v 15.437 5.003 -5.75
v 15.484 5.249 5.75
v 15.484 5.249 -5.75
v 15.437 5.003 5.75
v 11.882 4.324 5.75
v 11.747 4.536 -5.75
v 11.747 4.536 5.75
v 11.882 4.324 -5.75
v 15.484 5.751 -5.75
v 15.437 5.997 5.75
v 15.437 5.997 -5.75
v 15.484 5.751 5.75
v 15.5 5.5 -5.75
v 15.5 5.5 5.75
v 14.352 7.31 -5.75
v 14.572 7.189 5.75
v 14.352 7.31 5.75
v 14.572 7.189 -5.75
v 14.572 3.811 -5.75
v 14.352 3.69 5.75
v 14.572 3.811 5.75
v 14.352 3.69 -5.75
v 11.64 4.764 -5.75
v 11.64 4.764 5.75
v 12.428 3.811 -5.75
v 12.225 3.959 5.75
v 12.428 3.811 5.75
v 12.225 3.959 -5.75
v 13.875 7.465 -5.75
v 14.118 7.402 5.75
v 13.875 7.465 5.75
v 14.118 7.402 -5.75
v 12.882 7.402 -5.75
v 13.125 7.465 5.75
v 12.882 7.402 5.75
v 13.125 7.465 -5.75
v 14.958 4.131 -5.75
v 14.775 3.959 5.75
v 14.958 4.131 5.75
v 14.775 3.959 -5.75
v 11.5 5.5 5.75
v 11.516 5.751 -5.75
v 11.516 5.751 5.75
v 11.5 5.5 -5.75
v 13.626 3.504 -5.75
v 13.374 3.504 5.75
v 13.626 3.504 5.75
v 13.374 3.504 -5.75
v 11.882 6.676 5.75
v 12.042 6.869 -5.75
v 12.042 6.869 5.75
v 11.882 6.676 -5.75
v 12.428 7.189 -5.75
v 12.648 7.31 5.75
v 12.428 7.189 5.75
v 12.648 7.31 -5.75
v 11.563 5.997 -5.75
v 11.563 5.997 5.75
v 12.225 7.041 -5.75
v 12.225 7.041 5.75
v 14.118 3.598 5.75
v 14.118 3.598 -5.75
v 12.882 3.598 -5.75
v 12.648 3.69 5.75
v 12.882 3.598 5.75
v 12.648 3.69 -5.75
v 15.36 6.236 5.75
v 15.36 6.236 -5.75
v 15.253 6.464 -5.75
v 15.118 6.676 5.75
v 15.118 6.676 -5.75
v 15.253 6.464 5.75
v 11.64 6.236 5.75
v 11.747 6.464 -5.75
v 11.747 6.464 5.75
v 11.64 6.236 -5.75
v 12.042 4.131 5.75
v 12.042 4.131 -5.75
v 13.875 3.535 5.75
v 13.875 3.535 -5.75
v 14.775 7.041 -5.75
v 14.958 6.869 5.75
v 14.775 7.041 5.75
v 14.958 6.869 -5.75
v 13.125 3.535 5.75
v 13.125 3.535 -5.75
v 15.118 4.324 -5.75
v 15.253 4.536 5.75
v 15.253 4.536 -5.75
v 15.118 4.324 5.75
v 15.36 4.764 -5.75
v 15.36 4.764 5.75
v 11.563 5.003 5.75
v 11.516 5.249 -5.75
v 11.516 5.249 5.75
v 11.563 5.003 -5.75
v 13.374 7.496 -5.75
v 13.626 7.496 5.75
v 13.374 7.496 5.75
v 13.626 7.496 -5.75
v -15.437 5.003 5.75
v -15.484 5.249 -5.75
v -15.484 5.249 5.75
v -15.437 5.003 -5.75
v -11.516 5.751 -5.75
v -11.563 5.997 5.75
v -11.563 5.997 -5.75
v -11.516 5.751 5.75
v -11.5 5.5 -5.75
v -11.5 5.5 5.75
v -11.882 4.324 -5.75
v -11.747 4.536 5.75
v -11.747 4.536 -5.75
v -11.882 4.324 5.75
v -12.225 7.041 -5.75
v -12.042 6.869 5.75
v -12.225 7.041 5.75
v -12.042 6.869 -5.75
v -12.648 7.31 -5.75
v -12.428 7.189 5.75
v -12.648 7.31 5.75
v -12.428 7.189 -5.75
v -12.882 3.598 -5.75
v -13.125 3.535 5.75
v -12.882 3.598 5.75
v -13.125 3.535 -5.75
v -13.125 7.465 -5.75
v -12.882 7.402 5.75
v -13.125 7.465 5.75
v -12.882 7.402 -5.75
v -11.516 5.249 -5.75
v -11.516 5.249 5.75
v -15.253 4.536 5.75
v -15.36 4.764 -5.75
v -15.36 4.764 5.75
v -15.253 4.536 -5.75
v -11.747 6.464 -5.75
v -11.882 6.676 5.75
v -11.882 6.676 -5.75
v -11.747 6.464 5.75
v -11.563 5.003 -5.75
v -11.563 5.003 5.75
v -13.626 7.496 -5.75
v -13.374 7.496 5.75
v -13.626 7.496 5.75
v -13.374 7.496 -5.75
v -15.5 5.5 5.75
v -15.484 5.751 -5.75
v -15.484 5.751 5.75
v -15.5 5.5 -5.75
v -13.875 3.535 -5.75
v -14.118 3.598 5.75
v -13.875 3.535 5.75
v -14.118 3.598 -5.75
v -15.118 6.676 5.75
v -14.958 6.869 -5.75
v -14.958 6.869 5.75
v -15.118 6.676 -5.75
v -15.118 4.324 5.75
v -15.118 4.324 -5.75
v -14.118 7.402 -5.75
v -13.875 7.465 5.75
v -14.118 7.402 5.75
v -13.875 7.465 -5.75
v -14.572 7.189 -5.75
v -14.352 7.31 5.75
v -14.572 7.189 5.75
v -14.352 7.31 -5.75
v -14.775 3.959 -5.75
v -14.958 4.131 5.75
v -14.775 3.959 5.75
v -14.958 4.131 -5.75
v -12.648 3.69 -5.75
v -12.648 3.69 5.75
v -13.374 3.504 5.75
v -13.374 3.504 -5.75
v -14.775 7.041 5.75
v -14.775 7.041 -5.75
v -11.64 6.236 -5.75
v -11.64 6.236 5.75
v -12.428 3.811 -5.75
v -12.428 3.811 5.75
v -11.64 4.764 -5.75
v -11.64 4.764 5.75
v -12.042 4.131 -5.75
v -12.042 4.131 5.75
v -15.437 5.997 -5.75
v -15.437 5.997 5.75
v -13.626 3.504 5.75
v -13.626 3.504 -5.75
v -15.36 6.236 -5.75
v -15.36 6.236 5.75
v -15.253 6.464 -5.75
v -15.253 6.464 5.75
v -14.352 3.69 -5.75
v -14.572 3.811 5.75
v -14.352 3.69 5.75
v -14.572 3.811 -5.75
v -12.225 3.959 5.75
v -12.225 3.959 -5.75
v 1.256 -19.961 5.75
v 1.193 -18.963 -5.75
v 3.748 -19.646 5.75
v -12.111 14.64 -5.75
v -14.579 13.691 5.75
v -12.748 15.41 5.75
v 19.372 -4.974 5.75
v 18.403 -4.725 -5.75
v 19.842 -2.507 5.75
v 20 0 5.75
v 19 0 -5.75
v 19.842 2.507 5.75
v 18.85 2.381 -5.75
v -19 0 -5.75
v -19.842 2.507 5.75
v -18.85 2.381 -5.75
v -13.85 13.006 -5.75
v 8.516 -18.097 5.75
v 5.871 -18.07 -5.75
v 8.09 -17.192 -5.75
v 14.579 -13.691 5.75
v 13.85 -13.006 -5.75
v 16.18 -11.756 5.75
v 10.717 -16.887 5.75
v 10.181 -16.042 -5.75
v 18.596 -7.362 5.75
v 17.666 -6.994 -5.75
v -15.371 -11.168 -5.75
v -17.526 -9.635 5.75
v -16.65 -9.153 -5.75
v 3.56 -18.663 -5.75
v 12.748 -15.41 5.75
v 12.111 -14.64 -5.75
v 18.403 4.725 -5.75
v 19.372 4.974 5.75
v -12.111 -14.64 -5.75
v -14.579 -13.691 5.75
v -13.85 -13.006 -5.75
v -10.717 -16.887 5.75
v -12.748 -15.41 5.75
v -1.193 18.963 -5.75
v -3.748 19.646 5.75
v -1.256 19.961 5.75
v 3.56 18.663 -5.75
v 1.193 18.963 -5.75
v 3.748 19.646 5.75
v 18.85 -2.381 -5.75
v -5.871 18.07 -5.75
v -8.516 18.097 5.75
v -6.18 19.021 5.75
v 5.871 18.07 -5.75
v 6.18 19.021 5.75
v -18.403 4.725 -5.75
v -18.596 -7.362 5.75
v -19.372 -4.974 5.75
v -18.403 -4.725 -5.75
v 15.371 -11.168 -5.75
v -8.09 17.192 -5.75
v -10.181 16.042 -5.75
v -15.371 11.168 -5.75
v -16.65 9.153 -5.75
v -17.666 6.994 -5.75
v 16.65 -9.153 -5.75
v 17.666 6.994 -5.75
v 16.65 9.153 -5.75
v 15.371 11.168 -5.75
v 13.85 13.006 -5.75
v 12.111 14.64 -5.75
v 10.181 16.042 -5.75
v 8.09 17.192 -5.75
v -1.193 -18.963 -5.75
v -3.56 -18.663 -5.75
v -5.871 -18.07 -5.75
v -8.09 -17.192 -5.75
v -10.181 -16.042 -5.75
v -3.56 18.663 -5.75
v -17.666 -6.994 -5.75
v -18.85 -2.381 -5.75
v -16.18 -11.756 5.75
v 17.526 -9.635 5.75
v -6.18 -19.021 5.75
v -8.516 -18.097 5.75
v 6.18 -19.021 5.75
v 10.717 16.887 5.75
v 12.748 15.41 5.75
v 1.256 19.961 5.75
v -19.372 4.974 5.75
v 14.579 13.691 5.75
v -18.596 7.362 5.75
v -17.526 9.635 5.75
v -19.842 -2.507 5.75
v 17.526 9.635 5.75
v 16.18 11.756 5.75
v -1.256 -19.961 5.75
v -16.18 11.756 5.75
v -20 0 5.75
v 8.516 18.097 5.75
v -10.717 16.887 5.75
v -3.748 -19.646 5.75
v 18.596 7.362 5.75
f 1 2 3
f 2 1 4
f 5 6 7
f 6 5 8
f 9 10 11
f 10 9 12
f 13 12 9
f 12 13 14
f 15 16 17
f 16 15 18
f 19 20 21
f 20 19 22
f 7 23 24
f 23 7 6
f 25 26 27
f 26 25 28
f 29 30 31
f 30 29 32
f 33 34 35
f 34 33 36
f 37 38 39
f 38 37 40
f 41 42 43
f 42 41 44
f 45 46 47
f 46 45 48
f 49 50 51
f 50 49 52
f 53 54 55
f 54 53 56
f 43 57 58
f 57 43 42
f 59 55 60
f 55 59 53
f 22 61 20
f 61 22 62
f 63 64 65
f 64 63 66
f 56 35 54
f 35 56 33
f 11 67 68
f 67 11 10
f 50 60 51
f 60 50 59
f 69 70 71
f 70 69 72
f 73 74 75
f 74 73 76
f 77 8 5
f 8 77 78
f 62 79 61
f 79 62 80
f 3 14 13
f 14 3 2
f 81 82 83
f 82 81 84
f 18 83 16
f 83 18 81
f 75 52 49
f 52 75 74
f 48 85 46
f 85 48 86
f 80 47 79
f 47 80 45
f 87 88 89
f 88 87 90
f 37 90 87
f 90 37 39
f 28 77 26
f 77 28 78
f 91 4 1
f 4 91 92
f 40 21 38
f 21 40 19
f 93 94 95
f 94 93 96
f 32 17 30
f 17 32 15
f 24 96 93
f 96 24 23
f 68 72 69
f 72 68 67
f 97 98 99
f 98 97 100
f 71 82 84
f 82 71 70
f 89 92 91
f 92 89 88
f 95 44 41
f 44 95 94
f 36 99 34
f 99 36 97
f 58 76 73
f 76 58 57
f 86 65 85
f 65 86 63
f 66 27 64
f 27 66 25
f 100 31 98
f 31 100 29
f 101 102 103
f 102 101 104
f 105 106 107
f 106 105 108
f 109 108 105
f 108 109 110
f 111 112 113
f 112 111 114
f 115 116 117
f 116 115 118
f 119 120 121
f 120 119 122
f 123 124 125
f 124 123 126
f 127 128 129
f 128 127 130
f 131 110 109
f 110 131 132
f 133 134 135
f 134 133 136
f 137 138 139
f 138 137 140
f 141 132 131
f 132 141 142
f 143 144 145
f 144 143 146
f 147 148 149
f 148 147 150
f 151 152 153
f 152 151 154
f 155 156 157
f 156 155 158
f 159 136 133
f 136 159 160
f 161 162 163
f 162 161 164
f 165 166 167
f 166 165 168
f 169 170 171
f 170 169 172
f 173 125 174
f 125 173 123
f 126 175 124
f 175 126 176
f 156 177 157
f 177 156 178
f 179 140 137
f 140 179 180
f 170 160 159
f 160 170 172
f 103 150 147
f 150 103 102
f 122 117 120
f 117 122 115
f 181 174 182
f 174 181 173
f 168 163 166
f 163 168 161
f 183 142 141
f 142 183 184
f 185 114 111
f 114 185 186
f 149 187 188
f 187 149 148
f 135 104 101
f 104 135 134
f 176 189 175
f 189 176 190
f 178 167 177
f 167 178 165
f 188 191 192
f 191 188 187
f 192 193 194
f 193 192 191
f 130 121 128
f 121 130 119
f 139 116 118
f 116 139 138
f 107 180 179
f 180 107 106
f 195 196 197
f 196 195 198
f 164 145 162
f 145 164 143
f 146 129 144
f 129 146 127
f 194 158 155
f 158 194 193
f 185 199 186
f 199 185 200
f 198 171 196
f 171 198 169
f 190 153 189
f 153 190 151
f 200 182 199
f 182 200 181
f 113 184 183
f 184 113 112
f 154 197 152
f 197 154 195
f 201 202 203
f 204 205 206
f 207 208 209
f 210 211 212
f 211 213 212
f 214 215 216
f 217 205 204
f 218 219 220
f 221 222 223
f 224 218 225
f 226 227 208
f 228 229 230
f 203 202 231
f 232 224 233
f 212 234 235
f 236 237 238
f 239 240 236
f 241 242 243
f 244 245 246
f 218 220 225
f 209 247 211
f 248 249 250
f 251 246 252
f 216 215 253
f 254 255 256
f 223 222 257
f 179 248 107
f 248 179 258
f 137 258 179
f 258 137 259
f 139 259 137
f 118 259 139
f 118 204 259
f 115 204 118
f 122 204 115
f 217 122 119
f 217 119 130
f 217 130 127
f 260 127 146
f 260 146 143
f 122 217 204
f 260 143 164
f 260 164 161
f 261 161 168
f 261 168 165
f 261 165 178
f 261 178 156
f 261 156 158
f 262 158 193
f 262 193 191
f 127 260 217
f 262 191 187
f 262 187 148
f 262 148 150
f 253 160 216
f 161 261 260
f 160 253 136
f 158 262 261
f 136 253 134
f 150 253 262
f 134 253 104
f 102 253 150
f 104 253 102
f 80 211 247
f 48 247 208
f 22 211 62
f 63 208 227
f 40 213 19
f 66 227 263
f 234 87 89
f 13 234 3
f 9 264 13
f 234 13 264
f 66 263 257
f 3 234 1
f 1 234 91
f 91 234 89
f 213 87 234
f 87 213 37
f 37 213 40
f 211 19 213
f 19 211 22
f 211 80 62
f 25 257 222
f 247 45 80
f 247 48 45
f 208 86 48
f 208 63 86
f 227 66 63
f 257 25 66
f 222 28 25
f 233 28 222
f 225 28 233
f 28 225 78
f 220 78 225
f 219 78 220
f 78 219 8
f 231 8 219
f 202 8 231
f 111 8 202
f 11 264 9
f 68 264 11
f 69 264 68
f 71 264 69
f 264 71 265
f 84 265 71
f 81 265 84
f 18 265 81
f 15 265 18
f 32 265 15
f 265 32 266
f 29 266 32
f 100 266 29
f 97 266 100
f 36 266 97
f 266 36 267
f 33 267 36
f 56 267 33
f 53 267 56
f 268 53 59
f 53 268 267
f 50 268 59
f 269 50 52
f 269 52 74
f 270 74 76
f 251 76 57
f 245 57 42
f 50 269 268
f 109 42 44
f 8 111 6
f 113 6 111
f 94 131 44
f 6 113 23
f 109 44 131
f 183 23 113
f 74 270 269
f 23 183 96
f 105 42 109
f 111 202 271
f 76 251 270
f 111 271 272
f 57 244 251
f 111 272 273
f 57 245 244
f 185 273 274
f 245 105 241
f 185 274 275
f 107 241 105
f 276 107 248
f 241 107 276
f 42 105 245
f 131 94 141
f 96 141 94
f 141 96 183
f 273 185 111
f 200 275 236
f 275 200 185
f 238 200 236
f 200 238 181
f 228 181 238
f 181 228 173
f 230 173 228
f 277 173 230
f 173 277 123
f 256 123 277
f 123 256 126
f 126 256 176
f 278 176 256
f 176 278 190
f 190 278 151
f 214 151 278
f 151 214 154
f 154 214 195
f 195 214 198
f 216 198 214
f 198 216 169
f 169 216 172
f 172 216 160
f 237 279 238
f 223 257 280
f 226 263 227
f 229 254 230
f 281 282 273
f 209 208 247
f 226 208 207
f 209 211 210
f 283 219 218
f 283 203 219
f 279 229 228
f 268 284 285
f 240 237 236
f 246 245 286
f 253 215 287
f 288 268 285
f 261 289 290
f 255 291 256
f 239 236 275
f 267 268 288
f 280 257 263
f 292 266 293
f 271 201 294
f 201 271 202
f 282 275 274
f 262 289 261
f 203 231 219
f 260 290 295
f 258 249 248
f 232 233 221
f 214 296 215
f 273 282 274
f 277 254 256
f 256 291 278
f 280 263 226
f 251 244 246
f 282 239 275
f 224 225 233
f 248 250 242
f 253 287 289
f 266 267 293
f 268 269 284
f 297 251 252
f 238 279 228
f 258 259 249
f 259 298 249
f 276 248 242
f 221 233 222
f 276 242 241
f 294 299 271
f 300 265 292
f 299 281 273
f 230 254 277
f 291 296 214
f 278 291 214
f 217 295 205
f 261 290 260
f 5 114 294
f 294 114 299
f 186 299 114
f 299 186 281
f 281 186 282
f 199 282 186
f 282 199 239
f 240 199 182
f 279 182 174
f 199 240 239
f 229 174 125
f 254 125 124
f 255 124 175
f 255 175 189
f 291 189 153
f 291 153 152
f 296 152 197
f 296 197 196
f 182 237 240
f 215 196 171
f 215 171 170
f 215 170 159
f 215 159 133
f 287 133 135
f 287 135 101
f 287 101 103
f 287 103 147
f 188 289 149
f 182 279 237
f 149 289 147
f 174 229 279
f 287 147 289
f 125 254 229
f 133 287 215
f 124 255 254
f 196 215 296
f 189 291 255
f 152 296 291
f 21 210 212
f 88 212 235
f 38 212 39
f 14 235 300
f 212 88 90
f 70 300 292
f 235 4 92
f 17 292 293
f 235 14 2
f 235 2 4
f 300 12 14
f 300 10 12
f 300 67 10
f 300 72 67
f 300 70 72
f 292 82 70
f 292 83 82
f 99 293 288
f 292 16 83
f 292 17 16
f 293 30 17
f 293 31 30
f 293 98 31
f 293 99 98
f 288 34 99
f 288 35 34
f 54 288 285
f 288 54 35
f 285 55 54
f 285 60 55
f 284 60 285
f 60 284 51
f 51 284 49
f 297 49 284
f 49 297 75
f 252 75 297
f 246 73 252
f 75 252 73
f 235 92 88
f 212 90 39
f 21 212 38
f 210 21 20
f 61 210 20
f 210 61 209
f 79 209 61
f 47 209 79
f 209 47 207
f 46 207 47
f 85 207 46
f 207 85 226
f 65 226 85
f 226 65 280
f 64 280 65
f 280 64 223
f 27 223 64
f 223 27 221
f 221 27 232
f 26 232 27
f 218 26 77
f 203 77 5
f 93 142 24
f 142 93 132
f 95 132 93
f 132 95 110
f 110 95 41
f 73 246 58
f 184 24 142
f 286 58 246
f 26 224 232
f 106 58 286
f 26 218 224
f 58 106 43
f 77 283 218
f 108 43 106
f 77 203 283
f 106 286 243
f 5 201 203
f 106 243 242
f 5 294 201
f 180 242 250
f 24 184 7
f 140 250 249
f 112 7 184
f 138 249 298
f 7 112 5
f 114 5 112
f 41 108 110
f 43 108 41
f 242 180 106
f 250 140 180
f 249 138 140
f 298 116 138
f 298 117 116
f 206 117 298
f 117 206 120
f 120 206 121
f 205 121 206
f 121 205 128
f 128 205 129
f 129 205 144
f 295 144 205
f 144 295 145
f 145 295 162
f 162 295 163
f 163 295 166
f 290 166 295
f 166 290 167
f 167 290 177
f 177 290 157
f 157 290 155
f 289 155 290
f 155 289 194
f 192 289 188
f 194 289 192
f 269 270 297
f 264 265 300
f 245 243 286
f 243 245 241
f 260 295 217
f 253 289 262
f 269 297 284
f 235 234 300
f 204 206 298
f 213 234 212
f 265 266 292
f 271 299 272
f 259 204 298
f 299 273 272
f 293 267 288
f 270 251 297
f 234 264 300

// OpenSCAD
// Simple fitting to a door handle.

// Main variables
radius = 38 / 2.0;
thickness = 11.5;

// Center hole
center_hole_radius = 12 / 2.0;

// Stuff to fasten handle too
handle_hole_radius = 3 / 2.0;
handle_hole_offset = 15;

// Stuff to fasten fitting
fitting_hole_radius = 5 / 2.0;
fitting_hole_angle = 45;

lock_pad_hole_radius = 3 / 2.0 + 0.5;
lock_pad_hole_x_offset = 13.5;
lock_pad_hole_y_offset = 5.5;


// Pad and roundness
$fn = 50;
pad = 0.05;

// The handle holes - fastening the handle.
module handle_holes() {
    translate( [handle_hole_offset,0,0] ) {
        cylinder( h = thickness + 2*pad, r = handle_hole_radius, center = true );
    }
    translate( [-handle_hole_offset,0,0] ) {
        cylinder( h = thickness + 2*pad, r = handle_hole_radius, center = true );
    }
}

// The fitting holes - fastening the fitting.
module fitting_holes() {
    // Rotate into place
    rotate([0,0,fitting_hole_angle]) {
        // Translates in x to match edge of main fitting
        translate([radius, 0, 0]) {
            cylinder( h = thickness + 2*pad, , r = fitting_hole_radius, center = true );
        }
        translate([-radius, 0, 0]) {
            cylinder( h = thickness + 2*pad, , r = fitting_hole_radius, center = true );
        }
    }
}

// The fitting
module fitting_handle() {

    difference() {
        // The main cylinder
        cylinder( h = thickness, r = radius, center = true );

        // center hole
        cylinder( h = thickness + 2*pad, r = center_hole_radius, center = true );
        
        // Holes for fastening the handle
        handle_holes();

        // Tricky stuff.
        fitting_holes();
    }
}

// The handle holes - fastening the handle.
module lock_pad_holes() {
    translate([0,lock_pad_hole_y_offset,0]) {
        translate( [lock_pad_hole_x_offset,0,0] ) {
            cylinder( h = thickness + 2*pad, r = lock_pad_hole_radius, center = true );
        }
        translate( [-lock_pad_hole_x_offset,0,0] ) {
            cylinder( h = thickness + 2*pad, r = lock_pad_hole_radius, center = true );
        }

    }
}


// The fitting for the lock
module fitting_lock() {

    difference() {
        // The main cylinder
        cylinder( h = thickness, r1 = radius, r2= radius + 1, center = true );

        // Holes for fastening the lock pad
        lock_pad_holes();
    }
}




fitting_lock();
